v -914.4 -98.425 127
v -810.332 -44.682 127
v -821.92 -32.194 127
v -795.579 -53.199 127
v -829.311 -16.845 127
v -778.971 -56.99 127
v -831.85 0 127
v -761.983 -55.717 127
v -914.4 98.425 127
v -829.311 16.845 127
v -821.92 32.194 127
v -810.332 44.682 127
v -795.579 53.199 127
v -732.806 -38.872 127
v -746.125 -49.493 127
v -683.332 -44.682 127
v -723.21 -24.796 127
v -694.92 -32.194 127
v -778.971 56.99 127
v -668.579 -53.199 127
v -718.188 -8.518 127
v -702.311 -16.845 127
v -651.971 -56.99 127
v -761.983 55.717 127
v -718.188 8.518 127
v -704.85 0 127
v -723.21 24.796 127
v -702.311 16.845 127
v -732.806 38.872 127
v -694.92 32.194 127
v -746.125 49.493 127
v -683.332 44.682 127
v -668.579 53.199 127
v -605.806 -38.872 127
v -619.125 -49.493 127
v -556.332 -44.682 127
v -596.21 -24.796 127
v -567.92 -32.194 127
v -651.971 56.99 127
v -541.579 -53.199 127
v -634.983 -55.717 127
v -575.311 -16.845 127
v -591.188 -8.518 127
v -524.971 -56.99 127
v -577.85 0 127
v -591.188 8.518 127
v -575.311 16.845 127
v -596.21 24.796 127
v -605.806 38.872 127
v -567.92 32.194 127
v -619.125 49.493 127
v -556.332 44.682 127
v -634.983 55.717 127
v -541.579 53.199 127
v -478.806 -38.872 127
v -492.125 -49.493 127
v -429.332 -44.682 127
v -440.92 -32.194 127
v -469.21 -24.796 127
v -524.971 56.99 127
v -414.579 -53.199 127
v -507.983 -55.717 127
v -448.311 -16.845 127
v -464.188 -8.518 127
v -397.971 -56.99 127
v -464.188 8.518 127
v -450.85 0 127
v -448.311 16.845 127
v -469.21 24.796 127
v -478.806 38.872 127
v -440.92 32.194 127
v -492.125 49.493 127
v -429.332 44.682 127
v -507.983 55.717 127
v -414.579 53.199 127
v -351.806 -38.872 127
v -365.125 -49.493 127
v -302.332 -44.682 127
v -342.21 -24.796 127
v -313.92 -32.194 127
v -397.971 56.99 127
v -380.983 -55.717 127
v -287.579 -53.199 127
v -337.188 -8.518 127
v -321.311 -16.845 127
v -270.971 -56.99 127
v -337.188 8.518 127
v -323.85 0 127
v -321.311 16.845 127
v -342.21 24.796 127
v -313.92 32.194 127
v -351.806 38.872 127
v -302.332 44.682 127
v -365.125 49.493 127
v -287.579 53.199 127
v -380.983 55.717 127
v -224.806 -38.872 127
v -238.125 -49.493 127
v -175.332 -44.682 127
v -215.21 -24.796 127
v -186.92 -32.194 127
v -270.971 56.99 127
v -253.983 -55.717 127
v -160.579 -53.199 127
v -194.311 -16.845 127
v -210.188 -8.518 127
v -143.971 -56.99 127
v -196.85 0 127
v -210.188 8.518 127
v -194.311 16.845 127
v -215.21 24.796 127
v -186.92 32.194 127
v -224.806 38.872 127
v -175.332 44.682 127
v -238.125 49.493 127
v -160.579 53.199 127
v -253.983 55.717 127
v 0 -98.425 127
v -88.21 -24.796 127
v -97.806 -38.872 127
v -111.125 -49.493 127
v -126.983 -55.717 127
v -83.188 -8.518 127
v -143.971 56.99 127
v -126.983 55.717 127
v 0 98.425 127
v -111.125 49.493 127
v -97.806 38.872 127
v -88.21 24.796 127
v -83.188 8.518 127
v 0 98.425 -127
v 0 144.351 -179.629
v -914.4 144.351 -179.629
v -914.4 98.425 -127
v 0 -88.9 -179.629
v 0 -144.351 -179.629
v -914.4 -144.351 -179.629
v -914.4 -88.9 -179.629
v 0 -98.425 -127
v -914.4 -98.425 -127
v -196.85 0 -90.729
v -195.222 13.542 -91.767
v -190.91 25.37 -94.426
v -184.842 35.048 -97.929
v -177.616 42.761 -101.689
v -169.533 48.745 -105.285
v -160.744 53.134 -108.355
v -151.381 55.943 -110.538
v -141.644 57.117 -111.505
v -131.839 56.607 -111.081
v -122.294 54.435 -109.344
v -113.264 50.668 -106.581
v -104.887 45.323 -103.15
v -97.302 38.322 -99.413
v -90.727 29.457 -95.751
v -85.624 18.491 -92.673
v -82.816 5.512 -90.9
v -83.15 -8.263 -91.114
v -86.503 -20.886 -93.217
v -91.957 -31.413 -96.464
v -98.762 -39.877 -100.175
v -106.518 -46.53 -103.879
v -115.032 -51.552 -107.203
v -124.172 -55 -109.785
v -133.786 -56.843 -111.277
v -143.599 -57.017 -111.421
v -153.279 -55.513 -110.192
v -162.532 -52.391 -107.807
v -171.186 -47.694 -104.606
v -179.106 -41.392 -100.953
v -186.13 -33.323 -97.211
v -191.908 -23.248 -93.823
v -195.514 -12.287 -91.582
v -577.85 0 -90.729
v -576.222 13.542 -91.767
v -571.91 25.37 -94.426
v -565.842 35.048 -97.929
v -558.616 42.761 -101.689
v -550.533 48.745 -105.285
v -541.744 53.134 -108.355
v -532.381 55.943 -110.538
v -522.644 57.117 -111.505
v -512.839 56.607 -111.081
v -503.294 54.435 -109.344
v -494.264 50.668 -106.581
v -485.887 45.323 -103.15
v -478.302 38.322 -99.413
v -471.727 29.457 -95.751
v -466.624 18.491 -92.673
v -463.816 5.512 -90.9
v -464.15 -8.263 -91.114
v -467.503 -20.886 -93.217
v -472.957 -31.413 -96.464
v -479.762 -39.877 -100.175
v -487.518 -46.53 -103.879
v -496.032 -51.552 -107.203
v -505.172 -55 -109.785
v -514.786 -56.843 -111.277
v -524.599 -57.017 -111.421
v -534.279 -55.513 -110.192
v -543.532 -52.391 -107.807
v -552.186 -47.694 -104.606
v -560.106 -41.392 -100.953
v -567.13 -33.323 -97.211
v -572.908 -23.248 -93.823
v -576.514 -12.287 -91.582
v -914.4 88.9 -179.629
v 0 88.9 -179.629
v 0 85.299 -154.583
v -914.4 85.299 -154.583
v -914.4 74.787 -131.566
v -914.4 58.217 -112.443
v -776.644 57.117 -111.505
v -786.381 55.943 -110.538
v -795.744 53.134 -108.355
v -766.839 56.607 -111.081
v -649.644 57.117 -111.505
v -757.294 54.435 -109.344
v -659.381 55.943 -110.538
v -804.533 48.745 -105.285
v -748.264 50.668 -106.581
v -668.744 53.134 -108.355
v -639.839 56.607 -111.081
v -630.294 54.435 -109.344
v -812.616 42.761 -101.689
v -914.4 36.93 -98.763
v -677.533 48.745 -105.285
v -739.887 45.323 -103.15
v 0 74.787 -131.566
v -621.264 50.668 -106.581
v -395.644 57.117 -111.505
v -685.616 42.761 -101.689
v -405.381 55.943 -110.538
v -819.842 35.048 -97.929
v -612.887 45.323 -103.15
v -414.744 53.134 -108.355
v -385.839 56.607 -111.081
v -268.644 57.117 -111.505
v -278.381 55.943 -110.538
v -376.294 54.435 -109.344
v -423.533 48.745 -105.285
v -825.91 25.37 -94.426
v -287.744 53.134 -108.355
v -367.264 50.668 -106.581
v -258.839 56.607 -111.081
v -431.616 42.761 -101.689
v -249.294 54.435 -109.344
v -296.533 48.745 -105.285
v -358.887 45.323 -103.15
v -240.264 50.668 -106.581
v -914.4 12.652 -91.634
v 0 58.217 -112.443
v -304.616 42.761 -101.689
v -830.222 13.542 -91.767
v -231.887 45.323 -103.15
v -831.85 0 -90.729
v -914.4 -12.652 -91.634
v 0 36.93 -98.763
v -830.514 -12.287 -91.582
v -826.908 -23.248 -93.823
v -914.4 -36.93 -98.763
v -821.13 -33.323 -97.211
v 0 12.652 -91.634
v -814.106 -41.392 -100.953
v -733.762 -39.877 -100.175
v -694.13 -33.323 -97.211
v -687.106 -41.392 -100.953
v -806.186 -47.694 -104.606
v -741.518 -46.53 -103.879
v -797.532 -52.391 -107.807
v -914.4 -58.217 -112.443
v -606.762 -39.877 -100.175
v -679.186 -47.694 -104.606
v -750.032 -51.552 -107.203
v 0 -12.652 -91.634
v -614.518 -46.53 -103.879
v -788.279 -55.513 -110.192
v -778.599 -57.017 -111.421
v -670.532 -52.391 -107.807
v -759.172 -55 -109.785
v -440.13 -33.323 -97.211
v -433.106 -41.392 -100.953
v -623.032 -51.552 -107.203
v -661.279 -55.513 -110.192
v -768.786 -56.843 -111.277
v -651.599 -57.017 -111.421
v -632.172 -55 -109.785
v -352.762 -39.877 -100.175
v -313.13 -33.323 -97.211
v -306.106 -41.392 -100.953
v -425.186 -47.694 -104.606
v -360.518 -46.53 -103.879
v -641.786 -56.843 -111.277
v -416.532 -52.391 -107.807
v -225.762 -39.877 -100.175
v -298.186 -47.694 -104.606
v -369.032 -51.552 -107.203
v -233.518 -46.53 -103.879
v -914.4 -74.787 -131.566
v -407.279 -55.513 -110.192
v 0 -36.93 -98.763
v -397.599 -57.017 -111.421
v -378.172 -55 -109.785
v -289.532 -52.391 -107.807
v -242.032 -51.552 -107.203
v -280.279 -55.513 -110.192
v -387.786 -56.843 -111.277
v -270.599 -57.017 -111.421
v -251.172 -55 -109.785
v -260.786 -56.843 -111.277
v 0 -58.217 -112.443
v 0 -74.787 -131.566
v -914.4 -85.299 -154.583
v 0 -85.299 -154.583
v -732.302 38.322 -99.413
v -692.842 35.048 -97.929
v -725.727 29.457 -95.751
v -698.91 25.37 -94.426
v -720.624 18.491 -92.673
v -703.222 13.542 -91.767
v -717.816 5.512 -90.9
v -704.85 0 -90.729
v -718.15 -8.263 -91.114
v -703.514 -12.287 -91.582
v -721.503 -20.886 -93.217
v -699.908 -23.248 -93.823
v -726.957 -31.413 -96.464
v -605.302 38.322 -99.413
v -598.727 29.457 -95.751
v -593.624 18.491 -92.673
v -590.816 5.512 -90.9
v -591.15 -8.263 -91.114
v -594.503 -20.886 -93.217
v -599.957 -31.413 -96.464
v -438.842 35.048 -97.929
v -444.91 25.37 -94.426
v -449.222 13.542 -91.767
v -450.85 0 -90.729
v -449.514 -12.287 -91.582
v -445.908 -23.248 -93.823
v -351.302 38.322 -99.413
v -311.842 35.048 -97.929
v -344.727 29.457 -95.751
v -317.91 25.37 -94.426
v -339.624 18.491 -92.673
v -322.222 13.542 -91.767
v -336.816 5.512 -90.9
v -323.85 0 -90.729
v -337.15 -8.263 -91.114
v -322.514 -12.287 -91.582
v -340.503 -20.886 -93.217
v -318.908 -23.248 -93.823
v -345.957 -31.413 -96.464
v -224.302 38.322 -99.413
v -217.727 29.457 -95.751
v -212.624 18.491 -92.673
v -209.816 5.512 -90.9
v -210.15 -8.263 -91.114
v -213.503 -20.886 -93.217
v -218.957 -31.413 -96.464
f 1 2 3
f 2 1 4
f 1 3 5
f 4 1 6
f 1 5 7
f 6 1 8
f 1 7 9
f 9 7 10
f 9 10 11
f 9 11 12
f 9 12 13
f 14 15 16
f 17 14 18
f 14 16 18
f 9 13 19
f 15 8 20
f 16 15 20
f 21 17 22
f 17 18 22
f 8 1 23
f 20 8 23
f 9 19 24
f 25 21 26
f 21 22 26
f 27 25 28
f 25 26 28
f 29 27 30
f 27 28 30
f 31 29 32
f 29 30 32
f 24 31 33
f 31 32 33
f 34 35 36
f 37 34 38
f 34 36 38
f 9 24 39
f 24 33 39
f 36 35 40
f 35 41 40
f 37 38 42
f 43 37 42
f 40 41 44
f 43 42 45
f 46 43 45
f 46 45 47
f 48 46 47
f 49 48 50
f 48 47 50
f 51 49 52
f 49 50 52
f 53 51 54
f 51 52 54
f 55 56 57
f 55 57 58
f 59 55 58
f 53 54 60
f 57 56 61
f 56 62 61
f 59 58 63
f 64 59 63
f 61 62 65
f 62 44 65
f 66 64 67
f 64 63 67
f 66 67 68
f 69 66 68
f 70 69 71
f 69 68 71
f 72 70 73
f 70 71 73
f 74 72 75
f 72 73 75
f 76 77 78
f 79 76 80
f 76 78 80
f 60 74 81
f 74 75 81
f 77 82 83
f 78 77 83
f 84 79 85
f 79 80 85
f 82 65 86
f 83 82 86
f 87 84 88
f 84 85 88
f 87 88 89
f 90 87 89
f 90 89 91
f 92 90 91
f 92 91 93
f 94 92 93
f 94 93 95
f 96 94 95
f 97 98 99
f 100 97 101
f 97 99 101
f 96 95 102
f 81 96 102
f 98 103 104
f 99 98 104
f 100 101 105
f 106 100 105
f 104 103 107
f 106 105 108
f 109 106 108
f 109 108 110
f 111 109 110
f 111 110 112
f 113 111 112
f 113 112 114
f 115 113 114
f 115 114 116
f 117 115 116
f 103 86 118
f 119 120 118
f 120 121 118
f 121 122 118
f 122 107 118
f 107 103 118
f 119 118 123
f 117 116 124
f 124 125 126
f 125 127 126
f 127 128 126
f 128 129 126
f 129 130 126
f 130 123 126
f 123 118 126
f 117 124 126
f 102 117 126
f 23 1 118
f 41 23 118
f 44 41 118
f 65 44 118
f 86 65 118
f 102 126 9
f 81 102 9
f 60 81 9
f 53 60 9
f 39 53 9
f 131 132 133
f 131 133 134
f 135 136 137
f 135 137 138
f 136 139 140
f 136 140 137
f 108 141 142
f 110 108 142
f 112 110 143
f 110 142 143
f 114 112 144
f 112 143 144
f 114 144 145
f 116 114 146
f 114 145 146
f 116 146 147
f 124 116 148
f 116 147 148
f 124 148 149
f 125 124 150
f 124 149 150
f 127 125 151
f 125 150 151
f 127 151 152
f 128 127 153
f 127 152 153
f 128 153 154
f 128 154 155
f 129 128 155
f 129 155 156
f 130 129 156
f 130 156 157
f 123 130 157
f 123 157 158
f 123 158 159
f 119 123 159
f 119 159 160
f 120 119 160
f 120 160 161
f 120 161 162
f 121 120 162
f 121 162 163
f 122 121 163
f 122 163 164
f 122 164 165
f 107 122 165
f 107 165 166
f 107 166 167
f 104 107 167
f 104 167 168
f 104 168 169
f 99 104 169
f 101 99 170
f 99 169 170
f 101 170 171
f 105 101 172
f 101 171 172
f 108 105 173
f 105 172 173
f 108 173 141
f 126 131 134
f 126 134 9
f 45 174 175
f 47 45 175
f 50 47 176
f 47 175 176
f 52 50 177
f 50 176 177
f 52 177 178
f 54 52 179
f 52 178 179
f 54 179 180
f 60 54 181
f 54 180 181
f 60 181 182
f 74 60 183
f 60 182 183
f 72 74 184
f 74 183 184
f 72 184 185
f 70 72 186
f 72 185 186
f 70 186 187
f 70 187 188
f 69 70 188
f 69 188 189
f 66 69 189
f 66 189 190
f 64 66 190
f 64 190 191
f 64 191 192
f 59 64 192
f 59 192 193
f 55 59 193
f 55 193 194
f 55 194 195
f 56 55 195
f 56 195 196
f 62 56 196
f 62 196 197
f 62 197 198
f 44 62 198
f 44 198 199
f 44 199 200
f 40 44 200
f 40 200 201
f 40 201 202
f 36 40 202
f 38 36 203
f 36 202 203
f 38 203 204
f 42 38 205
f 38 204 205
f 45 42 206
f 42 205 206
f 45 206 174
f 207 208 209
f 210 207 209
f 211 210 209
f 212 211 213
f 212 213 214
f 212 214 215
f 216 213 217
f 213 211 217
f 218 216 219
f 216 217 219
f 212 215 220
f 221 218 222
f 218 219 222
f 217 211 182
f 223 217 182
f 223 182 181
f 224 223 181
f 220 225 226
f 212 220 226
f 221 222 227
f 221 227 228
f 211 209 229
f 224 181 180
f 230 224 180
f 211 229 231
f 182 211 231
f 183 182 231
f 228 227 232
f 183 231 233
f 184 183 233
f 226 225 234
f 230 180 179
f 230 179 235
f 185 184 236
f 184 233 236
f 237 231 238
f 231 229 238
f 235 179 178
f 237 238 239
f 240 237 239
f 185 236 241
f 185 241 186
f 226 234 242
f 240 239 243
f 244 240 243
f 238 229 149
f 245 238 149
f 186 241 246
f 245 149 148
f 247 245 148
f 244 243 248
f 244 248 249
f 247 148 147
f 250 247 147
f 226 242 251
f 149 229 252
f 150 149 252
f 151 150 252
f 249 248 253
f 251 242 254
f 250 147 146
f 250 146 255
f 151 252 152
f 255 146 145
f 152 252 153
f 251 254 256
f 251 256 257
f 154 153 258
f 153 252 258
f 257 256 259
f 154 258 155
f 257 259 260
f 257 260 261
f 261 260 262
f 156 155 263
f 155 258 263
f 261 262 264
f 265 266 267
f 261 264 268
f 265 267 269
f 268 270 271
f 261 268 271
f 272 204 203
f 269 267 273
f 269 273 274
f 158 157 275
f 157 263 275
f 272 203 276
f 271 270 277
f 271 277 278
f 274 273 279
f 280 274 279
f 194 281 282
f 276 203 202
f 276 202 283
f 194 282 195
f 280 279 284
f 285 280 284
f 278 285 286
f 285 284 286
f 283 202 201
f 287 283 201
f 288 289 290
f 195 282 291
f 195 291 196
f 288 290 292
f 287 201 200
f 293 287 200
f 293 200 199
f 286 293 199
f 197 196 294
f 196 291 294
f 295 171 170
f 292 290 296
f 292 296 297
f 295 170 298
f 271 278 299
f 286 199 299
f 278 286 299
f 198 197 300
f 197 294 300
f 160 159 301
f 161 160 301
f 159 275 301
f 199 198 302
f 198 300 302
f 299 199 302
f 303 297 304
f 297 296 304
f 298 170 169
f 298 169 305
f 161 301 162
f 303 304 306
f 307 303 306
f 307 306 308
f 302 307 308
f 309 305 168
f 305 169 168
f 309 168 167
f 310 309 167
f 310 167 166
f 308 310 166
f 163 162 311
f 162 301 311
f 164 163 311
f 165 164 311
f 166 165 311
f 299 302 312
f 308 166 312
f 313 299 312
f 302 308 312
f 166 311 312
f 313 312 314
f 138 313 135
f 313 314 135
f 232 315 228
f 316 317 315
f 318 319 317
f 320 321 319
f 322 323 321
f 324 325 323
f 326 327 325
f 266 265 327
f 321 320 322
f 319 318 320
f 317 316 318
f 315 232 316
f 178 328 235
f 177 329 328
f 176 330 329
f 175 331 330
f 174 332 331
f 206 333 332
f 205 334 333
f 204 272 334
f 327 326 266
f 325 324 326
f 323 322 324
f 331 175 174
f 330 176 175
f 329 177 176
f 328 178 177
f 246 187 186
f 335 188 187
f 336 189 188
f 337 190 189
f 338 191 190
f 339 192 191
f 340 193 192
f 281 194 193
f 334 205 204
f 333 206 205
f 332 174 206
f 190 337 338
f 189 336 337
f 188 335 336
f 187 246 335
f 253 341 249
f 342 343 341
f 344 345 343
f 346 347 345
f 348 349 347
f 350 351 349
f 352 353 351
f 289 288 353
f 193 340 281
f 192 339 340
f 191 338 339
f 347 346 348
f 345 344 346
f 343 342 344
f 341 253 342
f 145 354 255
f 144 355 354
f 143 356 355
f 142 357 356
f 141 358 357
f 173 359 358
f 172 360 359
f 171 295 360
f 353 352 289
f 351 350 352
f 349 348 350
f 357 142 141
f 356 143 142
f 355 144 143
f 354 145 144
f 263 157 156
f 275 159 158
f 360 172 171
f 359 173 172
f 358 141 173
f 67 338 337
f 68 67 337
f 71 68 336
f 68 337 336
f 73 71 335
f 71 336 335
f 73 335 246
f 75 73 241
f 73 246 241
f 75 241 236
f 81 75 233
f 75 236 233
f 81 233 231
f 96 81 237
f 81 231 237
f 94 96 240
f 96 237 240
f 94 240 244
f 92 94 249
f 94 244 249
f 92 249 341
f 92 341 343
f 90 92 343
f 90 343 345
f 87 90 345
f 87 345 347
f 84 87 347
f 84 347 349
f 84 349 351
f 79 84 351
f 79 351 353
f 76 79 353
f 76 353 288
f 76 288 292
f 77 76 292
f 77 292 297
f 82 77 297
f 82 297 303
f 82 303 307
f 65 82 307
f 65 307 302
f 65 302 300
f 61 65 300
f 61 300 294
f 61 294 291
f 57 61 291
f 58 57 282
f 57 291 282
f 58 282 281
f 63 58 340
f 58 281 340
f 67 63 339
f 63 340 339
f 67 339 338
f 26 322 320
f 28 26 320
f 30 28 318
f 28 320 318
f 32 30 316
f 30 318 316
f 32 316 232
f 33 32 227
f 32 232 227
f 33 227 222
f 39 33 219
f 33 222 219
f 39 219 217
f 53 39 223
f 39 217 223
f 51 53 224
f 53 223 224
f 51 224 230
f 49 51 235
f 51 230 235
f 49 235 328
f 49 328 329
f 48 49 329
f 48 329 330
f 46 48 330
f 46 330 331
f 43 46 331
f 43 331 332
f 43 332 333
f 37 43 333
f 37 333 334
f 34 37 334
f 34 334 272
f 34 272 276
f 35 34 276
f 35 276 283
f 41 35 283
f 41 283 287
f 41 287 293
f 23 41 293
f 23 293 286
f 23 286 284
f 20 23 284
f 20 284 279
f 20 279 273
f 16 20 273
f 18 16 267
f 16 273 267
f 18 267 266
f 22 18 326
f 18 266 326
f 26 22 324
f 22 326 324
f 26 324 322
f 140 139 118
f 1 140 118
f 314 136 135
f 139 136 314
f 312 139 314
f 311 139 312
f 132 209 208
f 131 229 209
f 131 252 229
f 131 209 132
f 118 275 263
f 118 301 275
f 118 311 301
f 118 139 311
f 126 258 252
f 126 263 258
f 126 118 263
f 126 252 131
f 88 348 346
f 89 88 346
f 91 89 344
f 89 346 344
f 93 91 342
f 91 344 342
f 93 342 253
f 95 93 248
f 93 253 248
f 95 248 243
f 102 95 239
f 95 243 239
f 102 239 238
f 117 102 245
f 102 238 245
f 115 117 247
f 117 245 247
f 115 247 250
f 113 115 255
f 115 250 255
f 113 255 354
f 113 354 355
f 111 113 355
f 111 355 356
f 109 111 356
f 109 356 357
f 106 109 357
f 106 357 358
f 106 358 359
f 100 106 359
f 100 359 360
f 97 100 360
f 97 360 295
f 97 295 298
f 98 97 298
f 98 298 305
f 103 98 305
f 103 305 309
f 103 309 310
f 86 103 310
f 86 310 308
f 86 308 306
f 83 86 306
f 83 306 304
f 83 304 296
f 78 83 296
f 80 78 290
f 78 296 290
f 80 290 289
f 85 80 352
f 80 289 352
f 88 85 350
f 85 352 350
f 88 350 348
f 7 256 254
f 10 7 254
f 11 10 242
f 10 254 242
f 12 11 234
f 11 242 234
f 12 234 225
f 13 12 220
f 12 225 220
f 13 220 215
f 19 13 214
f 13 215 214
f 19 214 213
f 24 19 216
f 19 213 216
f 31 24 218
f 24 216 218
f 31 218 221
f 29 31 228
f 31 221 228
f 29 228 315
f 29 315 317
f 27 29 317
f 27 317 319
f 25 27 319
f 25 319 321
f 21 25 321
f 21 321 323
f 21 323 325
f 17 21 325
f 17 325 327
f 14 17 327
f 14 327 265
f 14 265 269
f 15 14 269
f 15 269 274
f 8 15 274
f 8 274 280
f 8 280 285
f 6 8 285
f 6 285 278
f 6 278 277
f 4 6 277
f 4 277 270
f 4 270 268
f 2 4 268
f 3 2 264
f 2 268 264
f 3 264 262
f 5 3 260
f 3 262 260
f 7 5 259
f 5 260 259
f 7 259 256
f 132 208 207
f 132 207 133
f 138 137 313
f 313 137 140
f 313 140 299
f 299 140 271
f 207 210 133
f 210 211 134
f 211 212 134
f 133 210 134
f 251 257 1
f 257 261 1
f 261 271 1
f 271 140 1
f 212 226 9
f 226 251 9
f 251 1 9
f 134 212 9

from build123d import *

# Parameters (mm, degrees)
F0_W     = 196.85
F0_H     = 254
F1_DEPTH = 914.4
F3_D     = 114.3
F5_DEPTH = 914.4


with BuildPart() as f1:
    # F0 (on Right) → F1 (new body)
    with BuildSketch(Plane.YZ):
        Rectangle(F0_W, F0_H)
        Polygon((144.3510135603, -179.6291153114), (98.425, -127), (-98.425, -127), (-144.3510135603, -179.6291153114), align=None)
    extrude(amount=-F1_DEPTH)

    # F3 (through all)
    with Locations(Plane.XY.offset(127)):
        with Locations((-774.7, 0), (-647.7, 0), (-520.7, 0), (-393.7, 0), (-266.7, 0), (-139.7, 0)):
            Hole(F3_D / 2)

    # F4 (on face) → F5 (cut)
    with BuildSketch(Plane.YZ):
        with BuildLine():
            Line((-88.9, -179.6291153114), (88.9, -179.6291153114))
            ThreePointArc((88.9, -179.6291153114), (0, -90.7291153114), (-88.9, -179.6291153114))
        make_face()
    extrude(amount=-F5_DEPTH, mode=Mode.SUBTRACT)


solid = f1.part
